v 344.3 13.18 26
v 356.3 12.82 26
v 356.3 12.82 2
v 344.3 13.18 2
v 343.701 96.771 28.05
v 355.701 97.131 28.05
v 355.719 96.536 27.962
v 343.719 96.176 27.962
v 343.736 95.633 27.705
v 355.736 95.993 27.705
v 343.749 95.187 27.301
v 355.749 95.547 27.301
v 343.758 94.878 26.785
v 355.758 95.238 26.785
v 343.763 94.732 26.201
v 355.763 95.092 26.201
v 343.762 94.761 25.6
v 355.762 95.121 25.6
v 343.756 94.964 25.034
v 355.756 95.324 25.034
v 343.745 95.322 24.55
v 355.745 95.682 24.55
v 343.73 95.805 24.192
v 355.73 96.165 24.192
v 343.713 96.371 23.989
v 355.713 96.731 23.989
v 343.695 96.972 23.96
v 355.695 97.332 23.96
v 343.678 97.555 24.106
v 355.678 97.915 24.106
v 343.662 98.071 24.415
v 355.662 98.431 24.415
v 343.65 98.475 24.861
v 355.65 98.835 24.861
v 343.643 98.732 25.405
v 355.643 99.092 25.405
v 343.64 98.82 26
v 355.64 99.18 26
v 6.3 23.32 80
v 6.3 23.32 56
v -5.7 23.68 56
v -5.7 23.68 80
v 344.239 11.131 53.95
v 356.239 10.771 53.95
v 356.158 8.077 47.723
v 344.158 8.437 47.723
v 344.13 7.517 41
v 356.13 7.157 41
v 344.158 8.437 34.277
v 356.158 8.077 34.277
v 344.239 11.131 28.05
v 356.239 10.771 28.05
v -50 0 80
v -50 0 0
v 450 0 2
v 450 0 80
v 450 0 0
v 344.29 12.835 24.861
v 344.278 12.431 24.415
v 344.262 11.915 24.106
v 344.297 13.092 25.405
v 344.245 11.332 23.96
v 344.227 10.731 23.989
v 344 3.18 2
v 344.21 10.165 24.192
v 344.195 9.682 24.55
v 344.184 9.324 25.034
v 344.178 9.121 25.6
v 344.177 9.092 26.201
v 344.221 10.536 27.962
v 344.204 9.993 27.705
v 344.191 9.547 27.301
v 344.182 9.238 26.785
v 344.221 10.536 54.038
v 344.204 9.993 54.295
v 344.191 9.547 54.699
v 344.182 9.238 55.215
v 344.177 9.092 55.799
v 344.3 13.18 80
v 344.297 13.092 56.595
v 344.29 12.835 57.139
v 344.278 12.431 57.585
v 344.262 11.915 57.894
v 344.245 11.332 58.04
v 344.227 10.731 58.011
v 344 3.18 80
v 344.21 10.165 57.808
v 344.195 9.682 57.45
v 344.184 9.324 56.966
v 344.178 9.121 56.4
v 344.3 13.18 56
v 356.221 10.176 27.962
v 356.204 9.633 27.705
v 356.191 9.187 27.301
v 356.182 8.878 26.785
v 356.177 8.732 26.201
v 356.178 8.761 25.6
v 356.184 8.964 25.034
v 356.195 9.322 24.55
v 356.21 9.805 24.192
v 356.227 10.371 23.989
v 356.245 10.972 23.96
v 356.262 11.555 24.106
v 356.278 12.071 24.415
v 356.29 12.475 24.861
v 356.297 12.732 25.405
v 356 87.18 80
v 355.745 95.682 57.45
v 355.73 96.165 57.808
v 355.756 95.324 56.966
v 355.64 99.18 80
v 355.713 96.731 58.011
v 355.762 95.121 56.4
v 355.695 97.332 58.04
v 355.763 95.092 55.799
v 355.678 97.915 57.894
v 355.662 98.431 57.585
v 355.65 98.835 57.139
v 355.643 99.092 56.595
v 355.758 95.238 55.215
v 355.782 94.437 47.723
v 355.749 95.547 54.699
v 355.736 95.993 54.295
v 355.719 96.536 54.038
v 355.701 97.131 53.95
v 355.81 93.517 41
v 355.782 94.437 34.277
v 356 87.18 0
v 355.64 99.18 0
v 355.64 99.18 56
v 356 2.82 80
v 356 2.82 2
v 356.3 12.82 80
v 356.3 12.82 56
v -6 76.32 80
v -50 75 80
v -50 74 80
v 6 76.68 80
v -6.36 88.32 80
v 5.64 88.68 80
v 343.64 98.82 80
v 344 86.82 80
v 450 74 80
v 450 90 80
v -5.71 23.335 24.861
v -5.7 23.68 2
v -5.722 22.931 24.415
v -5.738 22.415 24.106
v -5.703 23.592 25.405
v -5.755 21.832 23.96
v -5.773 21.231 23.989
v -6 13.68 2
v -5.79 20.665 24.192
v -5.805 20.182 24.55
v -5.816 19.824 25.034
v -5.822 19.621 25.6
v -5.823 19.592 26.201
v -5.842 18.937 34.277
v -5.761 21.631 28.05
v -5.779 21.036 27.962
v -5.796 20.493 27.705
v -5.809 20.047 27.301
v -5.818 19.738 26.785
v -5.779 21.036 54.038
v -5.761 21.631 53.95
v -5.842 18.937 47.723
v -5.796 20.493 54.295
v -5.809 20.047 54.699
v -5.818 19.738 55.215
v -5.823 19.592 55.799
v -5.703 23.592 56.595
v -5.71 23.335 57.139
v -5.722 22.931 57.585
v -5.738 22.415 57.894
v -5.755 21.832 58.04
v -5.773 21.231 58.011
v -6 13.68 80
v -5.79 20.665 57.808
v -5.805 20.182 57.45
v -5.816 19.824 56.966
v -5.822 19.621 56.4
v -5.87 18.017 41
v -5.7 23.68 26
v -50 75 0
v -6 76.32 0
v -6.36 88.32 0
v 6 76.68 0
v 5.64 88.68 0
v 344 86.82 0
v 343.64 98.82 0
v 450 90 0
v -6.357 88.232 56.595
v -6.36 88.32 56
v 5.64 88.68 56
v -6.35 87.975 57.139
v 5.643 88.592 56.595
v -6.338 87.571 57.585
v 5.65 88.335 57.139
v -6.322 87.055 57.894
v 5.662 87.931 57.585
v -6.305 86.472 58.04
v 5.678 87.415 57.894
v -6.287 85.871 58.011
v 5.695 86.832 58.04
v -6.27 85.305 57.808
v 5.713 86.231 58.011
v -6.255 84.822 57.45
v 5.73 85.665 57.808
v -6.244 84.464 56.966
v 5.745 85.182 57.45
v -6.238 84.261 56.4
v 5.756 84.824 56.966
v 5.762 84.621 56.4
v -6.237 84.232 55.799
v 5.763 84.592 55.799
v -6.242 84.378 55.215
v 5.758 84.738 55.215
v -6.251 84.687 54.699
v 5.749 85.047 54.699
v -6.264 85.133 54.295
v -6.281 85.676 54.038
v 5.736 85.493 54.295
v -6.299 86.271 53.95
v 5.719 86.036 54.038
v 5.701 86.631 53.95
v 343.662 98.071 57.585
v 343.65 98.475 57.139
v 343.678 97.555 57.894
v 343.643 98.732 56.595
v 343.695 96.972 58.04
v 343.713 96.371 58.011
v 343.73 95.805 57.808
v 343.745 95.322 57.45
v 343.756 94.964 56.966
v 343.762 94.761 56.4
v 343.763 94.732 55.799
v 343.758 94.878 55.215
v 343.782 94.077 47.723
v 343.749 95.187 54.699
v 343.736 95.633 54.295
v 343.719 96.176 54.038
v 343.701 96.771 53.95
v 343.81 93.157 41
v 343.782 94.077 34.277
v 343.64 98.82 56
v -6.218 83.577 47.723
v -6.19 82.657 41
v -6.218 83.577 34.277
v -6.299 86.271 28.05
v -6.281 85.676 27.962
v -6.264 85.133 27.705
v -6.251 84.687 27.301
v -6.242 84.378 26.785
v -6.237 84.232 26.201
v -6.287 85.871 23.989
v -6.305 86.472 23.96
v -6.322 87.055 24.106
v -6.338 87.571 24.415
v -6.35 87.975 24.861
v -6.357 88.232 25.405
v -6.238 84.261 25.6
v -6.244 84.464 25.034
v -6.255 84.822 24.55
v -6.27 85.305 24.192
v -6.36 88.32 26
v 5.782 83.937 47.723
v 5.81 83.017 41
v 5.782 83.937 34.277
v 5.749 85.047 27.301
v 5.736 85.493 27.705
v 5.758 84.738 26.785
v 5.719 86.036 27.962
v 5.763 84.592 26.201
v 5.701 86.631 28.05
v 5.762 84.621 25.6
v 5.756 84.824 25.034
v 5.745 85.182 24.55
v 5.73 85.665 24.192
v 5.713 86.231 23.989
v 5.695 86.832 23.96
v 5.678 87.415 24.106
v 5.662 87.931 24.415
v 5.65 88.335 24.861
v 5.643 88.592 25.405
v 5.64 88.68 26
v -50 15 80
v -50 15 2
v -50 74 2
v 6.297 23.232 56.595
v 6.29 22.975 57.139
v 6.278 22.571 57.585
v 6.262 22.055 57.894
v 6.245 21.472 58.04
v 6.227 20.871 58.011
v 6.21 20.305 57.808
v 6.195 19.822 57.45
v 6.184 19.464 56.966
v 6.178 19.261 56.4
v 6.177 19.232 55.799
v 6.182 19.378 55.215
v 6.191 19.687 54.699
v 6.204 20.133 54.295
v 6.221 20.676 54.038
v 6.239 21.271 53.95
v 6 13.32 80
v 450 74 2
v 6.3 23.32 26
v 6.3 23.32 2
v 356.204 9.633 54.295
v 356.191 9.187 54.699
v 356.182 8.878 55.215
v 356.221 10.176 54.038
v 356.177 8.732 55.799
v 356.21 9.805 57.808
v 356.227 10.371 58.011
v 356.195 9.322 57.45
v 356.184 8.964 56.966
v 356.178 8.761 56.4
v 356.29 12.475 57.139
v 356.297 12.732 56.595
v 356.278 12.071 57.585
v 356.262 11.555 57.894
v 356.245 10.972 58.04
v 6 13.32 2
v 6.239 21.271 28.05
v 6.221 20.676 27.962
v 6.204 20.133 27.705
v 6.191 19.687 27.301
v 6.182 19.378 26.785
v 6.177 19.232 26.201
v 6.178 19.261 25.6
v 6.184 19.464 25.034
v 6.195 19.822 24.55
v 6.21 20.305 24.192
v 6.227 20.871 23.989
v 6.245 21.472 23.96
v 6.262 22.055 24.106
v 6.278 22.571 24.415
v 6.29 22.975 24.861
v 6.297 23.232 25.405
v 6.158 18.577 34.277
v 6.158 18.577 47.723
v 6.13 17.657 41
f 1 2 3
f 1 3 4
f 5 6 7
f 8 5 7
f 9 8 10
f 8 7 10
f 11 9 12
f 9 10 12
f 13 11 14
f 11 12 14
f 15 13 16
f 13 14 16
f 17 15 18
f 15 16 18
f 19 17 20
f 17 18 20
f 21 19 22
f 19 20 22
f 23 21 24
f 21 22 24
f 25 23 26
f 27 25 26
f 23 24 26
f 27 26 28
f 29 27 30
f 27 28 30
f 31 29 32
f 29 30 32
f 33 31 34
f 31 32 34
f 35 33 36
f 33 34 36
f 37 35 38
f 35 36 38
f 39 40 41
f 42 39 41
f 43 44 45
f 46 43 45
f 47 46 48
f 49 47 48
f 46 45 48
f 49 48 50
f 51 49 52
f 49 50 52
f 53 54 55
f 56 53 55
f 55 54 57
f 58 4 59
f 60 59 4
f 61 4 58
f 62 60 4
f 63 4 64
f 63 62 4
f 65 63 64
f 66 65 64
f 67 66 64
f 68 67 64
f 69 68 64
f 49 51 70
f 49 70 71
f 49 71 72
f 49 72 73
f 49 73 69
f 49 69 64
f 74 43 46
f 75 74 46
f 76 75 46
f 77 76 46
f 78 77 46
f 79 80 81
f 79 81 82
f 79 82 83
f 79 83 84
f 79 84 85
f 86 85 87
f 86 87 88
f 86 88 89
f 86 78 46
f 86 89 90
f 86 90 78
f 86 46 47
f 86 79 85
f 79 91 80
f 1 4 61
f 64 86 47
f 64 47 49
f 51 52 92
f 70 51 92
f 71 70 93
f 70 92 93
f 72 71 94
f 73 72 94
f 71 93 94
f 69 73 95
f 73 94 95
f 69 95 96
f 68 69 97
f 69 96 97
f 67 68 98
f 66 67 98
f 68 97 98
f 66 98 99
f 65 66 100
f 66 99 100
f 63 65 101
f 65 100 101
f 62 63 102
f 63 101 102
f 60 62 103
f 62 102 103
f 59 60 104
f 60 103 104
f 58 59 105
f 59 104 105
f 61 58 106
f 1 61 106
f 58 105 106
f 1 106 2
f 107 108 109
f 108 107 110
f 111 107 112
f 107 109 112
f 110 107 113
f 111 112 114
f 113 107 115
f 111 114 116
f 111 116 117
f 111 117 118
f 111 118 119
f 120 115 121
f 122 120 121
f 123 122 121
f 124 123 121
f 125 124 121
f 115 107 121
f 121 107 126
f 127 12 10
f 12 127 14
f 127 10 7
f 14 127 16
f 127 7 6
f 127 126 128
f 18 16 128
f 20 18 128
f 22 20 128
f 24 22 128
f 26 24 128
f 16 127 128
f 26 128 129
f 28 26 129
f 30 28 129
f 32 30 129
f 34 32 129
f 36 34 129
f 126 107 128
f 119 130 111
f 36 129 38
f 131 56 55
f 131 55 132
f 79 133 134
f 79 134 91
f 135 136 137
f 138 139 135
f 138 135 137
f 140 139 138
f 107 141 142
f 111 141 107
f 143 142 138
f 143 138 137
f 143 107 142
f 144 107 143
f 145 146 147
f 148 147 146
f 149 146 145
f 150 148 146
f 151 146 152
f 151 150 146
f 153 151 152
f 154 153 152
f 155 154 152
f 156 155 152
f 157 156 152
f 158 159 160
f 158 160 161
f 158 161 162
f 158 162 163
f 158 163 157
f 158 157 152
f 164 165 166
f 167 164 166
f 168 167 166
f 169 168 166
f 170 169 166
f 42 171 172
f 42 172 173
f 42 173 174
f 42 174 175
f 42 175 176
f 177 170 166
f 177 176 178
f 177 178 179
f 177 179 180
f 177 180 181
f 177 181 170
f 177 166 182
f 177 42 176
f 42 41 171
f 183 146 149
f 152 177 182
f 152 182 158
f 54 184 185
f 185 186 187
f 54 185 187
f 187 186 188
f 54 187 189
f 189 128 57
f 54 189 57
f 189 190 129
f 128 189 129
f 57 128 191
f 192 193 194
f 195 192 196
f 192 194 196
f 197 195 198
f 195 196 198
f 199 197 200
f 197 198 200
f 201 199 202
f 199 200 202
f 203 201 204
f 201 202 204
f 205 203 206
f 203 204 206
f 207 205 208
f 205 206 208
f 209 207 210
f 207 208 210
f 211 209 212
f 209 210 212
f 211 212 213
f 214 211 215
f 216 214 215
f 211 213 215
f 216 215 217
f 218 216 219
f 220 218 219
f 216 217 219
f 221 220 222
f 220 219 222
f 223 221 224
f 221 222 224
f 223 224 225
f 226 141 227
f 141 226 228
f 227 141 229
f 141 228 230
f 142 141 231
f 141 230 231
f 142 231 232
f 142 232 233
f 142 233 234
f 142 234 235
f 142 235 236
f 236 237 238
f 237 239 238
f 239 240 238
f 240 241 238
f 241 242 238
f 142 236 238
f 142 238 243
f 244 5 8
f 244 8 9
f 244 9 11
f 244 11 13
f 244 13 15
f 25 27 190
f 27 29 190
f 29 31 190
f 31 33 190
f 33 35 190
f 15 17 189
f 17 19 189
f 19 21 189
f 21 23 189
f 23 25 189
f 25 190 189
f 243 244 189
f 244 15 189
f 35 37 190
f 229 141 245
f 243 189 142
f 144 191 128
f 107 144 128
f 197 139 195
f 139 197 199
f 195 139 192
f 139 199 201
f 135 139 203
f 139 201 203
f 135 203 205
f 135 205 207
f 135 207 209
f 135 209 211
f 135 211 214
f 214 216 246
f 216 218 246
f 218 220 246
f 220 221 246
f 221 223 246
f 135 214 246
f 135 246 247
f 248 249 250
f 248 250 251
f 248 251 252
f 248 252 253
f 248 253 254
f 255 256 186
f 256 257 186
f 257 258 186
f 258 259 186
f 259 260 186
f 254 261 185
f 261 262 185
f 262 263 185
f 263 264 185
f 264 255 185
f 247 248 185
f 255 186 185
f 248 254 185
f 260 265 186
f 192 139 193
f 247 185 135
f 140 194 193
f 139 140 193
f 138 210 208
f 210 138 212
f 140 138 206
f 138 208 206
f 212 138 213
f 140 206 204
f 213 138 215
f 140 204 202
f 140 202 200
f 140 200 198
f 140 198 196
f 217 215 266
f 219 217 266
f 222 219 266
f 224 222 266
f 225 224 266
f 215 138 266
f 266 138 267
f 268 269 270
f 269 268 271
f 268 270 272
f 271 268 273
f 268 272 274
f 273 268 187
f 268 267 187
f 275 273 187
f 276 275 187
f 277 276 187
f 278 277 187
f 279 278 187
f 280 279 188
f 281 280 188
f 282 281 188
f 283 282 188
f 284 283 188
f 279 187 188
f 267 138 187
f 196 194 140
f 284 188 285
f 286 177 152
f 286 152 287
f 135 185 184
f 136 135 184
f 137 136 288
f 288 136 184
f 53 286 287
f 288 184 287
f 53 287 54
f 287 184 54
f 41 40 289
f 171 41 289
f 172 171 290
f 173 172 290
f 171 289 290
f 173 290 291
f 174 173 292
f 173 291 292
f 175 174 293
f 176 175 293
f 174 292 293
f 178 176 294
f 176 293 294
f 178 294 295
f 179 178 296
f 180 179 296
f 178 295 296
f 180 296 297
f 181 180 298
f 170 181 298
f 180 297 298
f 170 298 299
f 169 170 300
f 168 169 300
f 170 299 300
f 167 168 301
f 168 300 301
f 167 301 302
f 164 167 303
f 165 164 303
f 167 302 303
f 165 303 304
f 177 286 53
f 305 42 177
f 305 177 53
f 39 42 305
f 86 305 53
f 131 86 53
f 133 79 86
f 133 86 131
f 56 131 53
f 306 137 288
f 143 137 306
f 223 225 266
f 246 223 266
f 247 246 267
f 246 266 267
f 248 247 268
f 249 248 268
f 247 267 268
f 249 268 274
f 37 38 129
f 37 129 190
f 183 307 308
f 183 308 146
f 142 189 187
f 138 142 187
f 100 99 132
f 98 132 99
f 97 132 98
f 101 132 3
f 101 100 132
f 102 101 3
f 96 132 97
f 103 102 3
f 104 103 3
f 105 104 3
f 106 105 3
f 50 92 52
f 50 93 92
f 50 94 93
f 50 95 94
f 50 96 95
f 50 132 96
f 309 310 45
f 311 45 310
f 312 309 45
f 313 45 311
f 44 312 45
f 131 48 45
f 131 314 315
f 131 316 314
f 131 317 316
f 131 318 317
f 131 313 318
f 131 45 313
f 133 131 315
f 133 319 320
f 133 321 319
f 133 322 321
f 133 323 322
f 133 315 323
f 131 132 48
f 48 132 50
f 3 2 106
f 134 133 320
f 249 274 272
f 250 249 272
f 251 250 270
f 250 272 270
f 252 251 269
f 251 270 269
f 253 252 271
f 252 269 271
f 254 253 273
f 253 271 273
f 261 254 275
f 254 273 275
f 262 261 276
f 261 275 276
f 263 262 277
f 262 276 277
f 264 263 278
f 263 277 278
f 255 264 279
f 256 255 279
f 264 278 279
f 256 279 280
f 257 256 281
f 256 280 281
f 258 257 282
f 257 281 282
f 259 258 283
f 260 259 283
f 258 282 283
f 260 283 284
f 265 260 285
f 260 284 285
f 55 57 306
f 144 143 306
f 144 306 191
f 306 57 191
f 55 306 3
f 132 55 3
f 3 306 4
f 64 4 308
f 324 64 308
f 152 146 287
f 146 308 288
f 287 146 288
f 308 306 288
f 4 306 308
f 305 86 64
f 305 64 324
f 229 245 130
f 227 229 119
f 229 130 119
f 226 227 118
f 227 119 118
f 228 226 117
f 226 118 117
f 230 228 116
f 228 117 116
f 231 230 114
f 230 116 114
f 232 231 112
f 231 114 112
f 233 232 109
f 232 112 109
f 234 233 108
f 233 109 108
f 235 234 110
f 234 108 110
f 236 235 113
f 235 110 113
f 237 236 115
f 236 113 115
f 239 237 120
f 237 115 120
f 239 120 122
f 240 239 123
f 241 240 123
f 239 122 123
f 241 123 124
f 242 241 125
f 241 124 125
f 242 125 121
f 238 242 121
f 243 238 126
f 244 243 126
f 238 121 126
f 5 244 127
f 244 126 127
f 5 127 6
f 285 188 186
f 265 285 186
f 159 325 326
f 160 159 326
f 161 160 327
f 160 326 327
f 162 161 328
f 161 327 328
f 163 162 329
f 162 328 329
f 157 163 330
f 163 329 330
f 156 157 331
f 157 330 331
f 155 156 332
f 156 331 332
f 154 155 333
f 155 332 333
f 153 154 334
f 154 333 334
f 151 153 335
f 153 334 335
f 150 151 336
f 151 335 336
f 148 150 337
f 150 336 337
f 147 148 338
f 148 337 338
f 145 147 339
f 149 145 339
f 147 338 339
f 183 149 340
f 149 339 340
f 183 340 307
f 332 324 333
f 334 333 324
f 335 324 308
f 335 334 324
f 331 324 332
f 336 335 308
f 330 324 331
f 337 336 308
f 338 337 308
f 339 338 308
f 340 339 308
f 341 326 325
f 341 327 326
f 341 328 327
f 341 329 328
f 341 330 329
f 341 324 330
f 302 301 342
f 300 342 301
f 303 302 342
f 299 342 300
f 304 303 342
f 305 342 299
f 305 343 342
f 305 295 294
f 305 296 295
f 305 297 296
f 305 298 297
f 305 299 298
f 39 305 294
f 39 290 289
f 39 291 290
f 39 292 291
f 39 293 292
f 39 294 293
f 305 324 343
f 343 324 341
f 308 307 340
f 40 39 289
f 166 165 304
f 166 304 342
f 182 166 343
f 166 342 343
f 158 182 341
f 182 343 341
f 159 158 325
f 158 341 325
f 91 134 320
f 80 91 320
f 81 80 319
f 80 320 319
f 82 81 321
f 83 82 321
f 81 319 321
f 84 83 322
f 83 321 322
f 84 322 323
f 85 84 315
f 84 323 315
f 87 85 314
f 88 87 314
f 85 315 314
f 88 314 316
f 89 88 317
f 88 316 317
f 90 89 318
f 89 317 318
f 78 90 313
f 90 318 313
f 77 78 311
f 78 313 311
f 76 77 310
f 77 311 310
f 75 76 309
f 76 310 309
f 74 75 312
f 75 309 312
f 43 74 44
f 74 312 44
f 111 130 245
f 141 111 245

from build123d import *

# Parameters (mm, degrees)
PAD_DEPTH       = 80
POCKET_DEPTH    = 78
POCKET001_DEPTH = 408.7079232475
POCKET002_DEPTH = 408.4326470939


with BuildPart() as part:
    # Sketch → Pad (new body)
    with BuildSketch(Plane.XY):
        Polygon((450, 0), (450, 90), (356, 87.18), (355.64, 99.18), (343.64, 98.82), (344, 86.82), (6, 76.68), (5.64, 88.6800000001), (-6.36, 88.3200000001), (-6, 76.32), (-50, 75), (-50, 0), align=None)
    extrude(amount=PAD_DEPTH)

    # Sketch001 (on Face14 of Pad) → Pocket (cut)
    with BuildSketch(Plane.XY.offset(80)):
        Polygon((-50, 15), (-50, 74), (450, 74), (450, 0), (356, 2.82), (356.3, 12.82), (344.3, 13.18), (344, 3.18), (6, 13.32), (6.3, 23.32), (-5.7, 23.68), (-6, 13.68), align=None)
    extrude(amount=-POCKET_DEPTH, mode=Mode.SUBTRACT)

    # Sketch002 (on Face26 of Pocket) → Pocket001 (cut, through all)
    with BuildSketch(Plane(origin=(355.5953641722, -10.6678609252, 0), x_dir=(0.0299865091, 0.9995503035, 0), z_dir=(0.9995503035, -0.0299865091, 0))):
        with BuildLine():
            ThreePointArc((23.4984280855, 56), (19.9988591841, 57.4495689014), (21.4484280855, 53.95))
            ThreePointArc((21.4484280855, 53.95), (17.8329435114, 41), (21.4484280855, 28.05))
            ThreePointArc((21.4484280855, 28.05), (19.9988591841, 24.5504310986), (23.4984280855, 26))
            Line((23.4984280855, 26), (23.4984280855, 56))
        make_face()
    extrude(amount=-POCKET001_DEPTH, mode=Mode.SUBTRACT)

    # Sketch003 (on Face14 of Pocket001) → Pocket002 (cut, through all)
    with BuildSketch(Plane(origin=(358.2929363573, 10.7487880907, 0), x_dir=(-0.0299865091, 0.9995503035, 0), z_dir=(0.9995503035, 0.0299865091, 0))):
        with BuildLine():
            ThreePointArc((88.470997005, 56), (84.9714281036, 57.4495689014), (86.420997005, 53.95))
            ThreePointArc((86.420997005, 53.95), (82.8055124309, 41), (86.420997005, 28.05))
            ThreePointArc((86.420997005, 28.05), (84.9714281036, 24.5504310986), (88.470997005, 26))
            Line((88.470997005, 26), (88.470997005, 56))
        make_face()
    extrude(amount=-POCKET002_DEPTH, mode=Mode.SUBTRACT)


solid = part.part
